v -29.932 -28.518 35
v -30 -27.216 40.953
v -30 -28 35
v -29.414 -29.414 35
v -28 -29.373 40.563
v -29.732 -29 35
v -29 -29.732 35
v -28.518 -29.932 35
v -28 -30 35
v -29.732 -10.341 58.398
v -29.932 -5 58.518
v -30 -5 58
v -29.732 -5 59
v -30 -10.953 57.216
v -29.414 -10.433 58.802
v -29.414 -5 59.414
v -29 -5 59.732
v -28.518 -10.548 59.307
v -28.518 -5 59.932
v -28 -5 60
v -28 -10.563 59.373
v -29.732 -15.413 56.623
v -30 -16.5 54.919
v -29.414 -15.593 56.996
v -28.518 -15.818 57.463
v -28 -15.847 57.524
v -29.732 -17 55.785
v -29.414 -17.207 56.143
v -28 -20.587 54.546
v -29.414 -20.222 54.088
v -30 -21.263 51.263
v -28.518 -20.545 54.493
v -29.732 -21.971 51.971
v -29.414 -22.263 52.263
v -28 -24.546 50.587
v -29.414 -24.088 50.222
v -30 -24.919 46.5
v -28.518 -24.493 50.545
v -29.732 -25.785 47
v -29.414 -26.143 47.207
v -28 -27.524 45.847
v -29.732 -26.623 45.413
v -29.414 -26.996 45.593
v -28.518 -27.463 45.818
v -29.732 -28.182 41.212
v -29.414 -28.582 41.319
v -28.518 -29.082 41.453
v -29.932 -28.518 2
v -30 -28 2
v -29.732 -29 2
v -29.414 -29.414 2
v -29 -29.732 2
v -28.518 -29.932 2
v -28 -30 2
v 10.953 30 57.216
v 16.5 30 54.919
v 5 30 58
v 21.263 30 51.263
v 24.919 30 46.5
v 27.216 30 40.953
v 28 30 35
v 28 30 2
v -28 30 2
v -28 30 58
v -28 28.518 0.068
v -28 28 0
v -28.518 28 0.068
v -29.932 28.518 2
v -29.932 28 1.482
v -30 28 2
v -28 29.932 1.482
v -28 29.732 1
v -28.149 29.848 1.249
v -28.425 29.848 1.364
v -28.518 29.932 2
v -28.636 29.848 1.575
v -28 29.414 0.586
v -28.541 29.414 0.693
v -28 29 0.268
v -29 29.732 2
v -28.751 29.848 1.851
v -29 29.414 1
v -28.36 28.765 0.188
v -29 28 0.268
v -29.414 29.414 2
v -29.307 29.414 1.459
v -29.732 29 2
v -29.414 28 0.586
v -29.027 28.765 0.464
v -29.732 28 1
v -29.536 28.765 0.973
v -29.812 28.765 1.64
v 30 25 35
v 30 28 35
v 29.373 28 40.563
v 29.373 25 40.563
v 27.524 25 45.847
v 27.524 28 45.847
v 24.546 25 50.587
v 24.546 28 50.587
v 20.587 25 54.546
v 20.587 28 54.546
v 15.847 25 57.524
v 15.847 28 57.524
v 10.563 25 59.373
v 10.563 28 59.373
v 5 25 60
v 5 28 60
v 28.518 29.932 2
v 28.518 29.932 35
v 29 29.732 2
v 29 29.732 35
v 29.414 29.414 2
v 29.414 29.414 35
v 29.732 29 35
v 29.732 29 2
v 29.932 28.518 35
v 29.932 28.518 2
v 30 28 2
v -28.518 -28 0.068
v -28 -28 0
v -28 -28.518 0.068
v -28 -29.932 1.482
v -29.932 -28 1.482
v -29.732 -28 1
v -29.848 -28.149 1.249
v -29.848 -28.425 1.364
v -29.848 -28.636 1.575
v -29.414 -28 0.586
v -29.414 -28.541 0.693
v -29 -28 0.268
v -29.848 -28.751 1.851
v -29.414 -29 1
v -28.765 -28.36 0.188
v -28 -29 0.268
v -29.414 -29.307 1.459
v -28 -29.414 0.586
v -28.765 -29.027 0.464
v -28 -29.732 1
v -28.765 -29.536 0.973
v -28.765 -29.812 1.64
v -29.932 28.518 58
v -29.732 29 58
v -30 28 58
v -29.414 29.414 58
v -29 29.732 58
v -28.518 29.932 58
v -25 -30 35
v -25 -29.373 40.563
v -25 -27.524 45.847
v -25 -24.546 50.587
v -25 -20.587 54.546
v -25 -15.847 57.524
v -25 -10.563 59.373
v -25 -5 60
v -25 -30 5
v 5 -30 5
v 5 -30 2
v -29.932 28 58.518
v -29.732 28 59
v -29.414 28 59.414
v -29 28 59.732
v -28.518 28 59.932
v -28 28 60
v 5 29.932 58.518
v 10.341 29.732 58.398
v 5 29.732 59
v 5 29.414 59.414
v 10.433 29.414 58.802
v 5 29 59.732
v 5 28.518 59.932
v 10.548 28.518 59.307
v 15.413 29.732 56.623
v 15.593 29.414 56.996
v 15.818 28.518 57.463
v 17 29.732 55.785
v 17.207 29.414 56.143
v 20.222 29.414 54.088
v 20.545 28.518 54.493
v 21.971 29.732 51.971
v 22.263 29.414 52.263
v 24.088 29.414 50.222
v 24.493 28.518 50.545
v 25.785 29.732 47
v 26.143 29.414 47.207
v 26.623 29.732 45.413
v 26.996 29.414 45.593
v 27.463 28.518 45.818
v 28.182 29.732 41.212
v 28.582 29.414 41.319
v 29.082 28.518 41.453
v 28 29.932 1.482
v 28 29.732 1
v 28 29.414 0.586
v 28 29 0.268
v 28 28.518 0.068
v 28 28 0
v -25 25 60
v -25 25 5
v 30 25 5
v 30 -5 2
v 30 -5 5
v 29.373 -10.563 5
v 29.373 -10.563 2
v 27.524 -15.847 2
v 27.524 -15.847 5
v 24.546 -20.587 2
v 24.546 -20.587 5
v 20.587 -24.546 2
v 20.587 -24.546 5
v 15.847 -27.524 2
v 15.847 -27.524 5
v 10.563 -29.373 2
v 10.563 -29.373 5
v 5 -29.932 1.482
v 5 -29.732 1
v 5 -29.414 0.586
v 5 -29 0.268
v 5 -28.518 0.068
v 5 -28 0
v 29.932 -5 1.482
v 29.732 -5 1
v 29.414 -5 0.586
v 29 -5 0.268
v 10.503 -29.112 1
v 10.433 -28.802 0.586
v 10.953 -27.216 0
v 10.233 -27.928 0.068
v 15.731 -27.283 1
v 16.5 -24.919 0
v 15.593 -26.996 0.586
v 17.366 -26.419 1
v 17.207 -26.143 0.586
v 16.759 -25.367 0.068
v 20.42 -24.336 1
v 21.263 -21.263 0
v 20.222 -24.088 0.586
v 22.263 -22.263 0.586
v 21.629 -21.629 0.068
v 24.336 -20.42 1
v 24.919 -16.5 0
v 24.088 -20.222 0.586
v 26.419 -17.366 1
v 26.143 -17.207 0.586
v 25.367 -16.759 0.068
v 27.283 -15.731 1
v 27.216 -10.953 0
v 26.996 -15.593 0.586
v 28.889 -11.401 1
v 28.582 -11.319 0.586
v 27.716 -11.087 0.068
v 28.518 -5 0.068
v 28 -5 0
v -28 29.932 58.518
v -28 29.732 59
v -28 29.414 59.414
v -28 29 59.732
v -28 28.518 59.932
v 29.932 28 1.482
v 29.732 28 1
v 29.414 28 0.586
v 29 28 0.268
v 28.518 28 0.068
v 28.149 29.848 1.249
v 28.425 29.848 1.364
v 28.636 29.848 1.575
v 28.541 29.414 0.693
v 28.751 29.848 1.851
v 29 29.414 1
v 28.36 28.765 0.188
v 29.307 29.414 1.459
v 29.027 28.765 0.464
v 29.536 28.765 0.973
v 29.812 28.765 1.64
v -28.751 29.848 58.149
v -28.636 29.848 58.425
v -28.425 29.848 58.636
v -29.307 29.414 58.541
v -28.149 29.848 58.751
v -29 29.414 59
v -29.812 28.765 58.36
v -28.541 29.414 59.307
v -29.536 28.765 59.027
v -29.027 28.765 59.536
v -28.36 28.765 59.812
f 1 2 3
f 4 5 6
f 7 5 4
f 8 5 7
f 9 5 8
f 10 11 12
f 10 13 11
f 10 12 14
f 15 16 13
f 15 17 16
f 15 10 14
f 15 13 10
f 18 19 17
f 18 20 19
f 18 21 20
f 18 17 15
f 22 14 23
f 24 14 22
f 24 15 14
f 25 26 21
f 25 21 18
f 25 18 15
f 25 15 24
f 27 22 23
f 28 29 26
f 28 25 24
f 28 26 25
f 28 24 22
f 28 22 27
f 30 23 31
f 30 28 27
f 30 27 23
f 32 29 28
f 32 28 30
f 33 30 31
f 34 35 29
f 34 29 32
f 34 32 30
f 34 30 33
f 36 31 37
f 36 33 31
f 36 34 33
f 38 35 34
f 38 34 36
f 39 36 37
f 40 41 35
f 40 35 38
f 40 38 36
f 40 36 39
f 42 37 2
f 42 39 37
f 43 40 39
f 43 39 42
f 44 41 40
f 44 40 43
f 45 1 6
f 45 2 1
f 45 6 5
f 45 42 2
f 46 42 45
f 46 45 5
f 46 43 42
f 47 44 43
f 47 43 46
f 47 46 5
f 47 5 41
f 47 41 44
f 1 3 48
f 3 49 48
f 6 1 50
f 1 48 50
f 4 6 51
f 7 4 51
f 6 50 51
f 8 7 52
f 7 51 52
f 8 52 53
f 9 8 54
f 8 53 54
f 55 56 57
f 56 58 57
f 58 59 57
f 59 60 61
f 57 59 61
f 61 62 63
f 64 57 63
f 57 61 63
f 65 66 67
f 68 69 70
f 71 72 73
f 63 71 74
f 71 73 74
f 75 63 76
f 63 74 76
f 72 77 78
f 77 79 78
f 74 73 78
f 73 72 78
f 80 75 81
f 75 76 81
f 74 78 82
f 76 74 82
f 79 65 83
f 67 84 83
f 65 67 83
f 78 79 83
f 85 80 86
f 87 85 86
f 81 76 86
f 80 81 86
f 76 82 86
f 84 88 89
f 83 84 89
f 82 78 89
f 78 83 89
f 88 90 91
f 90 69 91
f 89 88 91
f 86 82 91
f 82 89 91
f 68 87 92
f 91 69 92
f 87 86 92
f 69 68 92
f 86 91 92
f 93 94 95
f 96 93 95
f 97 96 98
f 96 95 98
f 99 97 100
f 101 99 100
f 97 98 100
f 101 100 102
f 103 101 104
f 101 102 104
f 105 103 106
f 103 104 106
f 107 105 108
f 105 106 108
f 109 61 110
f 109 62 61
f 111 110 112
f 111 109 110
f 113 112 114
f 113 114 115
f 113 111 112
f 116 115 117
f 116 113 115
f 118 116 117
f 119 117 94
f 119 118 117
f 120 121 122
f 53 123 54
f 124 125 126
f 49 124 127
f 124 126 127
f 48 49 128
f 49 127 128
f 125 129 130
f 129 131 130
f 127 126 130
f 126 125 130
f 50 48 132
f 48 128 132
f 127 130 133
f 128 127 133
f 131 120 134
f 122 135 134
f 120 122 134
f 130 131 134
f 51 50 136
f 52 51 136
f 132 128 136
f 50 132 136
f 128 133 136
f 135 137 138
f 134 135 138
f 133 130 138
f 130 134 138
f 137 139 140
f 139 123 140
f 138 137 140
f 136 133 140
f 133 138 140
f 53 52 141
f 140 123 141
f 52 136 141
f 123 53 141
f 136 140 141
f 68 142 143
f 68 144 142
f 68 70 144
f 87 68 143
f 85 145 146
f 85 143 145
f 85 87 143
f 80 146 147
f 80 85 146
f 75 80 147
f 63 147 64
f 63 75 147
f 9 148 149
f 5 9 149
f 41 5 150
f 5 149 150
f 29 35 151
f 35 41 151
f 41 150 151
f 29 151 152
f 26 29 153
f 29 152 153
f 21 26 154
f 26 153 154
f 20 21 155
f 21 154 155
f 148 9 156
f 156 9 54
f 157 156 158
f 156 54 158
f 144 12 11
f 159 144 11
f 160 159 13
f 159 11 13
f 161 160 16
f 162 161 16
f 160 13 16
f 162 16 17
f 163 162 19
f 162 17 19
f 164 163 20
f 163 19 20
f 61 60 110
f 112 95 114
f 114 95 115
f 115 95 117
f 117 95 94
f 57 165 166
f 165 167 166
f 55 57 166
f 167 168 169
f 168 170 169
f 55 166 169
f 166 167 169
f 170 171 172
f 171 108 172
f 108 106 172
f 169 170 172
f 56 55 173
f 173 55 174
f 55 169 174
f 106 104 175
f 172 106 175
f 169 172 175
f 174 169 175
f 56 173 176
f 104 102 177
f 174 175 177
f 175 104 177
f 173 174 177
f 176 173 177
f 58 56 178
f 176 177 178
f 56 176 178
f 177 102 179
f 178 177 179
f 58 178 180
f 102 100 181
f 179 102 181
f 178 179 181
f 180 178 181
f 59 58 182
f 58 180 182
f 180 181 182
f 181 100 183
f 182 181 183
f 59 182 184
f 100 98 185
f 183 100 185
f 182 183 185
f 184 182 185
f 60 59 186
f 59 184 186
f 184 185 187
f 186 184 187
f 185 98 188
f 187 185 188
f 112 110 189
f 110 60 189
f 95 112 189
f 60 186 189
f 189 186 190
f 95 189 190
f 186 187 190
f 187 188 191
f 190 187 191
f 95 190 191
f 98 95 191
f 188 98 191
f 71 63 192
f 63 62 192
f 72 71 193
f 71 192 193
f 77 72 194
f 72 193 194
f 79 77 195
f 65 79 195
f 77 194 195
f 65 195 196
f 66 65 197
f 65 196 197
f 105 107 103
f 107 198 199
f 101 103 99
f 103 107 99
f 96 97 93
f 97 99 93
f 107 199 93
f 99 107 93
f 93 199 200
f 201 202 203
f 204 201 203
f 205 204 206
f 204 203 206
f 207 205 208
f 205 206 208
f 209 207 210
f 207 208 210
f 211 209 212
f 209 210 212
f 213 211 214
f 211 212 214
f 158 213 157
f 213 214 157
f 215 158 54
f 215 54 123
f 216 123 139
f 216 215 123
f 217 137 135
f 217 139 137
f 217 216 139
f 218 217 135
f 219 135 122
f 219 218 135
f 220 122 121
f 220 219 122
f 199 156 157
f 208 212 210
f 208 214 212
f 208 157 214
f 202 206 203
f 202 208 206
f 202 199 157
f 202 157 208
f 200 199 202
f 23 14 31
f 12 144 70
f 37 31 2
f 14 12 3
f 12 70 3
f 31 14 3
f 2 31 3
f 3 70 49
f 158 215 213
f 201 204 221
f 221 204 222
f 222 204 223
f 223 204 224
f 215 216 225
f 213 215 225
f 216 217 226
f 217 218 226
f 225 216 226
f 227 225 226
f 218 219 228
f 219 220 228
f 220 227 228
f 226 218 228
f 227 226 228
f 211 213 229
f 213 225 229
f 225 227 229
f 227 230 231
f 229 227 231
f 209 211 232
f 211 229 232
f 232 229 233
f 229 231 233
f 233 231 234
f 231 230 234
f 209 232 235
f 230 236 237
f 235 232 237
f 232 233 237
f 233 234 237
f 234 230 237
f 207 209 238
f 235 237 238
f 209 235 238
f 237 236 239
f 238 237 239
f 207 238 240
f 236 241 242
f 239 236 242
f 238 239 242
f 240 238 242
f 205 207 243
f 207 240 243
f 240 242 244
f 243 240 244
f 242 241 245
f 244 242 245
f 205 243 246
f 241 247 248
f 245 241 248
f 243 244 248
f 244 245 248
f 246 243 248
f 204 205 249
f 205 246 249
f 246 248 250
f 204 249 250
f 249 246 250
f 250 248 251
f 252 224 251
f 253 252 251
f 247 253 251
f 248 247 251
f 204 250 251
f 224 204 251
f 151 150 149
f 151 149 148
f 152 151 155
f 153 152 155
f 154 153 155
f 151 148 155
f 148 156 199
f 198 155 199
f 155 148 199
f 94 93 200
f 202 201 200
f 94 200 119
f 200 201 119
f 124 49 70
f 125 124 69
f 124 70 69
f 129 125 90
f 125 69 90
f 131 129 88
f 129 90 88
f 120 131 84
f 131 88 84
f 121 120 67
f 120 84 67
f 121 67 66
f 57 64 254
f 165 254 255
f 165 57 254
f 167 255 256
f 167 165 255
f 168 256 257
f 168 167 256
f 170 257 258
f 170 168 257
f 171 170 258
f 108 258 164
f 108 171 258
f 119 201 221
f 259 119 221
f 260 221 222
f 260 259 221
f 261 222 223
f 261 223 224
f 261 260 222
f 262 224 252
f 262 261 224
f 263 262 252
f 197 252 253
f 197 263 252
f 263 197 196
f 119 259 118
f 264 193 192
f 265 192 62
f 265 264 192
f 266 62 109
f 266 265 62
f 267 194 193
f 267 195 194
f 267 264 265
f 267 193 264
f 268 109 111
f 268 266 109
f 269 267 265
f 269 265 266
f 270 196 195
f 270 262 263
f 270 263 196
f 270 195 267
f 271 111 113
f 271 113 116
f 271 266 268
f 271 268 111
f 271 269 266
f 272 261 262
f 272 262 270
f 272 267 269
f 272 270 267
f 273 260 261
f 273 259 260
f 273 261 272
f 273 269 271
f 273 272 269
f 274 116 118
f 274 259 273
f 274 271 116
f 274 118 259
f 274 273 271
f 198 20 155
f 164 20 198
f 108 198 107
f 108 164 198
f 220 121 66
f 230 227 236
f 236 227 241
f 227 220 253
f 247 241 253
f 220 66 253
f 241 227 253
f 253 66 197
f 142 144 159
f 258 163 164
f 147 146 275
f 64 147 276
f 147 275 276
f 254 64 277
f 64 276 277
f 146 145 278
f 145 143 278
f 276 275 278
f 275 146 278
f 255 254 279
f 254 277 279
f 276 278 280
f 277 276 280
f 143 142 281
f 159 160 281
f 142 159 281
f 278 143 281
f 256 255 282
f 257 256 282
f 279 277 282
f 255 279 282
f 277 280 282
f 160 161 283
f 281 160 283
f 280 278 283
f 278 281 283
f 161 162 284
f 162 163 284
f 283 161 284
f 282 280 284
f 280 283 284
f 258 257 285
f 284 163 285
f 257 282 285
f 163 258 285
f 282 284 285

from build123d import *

# Parameters (mm, degrees)
F0_W     = 60
F0_H     = 60
F1_DEPTH = 5
F2_W     = 55
F2_H     = 5
F3_DEPTH = 55
F4_R     = 25
F5_R     = 2


with BuildPart() as f1:
    # F0 (on Top) → F1 (new body)
    with BuildSketch(Plane.XY):
        Rectangle(F0_W, F0_H)
    extrude(amount=F1_DEPTH)

    # F2 (on face) → F3 (join)
    with BuildSketch(Plane.XY.offset(5)):
        Polygon((-25, 30), (-30, 30), (-30, -30), (-25, -30), (-25, 25), align=None)
        with Locations((2.5, 27.5)):
            Rectangle(F2_W, F2_H)
    extrude(amount=F3_DEPTH)

    # F4
    f4_edges = [f1.edges().sort_by_distance(p)[0] for p in [
        (30, 27.5, 60),
        (-27.5, -30, 60),
        (30, -30, 2.5),
    ]]
    fillet(f4_edges, radius=F4_R)

    # F5
    f5_edges = [f1.edges().sort_by_distance(p)[0] for p in [
        (-12.5, -30, 0),
        (22.67767, -22.67767, 0),
        (-30, 0, 0),
        (30, 12.5, 0),
        (0, 30, 0),
        (-30, 12.5, 60),
        (-30, -22.67767, 52.67767),
        (-30, 30, 30),
        (-30, -30, 17.5),
        (30, 30, 17.5),
        (22.67767, 30, 52.67767),
        (-12.5, 30, 60),
    ]]
    fillet(f5_edges, radius=F5_R)


solid = f1.part
